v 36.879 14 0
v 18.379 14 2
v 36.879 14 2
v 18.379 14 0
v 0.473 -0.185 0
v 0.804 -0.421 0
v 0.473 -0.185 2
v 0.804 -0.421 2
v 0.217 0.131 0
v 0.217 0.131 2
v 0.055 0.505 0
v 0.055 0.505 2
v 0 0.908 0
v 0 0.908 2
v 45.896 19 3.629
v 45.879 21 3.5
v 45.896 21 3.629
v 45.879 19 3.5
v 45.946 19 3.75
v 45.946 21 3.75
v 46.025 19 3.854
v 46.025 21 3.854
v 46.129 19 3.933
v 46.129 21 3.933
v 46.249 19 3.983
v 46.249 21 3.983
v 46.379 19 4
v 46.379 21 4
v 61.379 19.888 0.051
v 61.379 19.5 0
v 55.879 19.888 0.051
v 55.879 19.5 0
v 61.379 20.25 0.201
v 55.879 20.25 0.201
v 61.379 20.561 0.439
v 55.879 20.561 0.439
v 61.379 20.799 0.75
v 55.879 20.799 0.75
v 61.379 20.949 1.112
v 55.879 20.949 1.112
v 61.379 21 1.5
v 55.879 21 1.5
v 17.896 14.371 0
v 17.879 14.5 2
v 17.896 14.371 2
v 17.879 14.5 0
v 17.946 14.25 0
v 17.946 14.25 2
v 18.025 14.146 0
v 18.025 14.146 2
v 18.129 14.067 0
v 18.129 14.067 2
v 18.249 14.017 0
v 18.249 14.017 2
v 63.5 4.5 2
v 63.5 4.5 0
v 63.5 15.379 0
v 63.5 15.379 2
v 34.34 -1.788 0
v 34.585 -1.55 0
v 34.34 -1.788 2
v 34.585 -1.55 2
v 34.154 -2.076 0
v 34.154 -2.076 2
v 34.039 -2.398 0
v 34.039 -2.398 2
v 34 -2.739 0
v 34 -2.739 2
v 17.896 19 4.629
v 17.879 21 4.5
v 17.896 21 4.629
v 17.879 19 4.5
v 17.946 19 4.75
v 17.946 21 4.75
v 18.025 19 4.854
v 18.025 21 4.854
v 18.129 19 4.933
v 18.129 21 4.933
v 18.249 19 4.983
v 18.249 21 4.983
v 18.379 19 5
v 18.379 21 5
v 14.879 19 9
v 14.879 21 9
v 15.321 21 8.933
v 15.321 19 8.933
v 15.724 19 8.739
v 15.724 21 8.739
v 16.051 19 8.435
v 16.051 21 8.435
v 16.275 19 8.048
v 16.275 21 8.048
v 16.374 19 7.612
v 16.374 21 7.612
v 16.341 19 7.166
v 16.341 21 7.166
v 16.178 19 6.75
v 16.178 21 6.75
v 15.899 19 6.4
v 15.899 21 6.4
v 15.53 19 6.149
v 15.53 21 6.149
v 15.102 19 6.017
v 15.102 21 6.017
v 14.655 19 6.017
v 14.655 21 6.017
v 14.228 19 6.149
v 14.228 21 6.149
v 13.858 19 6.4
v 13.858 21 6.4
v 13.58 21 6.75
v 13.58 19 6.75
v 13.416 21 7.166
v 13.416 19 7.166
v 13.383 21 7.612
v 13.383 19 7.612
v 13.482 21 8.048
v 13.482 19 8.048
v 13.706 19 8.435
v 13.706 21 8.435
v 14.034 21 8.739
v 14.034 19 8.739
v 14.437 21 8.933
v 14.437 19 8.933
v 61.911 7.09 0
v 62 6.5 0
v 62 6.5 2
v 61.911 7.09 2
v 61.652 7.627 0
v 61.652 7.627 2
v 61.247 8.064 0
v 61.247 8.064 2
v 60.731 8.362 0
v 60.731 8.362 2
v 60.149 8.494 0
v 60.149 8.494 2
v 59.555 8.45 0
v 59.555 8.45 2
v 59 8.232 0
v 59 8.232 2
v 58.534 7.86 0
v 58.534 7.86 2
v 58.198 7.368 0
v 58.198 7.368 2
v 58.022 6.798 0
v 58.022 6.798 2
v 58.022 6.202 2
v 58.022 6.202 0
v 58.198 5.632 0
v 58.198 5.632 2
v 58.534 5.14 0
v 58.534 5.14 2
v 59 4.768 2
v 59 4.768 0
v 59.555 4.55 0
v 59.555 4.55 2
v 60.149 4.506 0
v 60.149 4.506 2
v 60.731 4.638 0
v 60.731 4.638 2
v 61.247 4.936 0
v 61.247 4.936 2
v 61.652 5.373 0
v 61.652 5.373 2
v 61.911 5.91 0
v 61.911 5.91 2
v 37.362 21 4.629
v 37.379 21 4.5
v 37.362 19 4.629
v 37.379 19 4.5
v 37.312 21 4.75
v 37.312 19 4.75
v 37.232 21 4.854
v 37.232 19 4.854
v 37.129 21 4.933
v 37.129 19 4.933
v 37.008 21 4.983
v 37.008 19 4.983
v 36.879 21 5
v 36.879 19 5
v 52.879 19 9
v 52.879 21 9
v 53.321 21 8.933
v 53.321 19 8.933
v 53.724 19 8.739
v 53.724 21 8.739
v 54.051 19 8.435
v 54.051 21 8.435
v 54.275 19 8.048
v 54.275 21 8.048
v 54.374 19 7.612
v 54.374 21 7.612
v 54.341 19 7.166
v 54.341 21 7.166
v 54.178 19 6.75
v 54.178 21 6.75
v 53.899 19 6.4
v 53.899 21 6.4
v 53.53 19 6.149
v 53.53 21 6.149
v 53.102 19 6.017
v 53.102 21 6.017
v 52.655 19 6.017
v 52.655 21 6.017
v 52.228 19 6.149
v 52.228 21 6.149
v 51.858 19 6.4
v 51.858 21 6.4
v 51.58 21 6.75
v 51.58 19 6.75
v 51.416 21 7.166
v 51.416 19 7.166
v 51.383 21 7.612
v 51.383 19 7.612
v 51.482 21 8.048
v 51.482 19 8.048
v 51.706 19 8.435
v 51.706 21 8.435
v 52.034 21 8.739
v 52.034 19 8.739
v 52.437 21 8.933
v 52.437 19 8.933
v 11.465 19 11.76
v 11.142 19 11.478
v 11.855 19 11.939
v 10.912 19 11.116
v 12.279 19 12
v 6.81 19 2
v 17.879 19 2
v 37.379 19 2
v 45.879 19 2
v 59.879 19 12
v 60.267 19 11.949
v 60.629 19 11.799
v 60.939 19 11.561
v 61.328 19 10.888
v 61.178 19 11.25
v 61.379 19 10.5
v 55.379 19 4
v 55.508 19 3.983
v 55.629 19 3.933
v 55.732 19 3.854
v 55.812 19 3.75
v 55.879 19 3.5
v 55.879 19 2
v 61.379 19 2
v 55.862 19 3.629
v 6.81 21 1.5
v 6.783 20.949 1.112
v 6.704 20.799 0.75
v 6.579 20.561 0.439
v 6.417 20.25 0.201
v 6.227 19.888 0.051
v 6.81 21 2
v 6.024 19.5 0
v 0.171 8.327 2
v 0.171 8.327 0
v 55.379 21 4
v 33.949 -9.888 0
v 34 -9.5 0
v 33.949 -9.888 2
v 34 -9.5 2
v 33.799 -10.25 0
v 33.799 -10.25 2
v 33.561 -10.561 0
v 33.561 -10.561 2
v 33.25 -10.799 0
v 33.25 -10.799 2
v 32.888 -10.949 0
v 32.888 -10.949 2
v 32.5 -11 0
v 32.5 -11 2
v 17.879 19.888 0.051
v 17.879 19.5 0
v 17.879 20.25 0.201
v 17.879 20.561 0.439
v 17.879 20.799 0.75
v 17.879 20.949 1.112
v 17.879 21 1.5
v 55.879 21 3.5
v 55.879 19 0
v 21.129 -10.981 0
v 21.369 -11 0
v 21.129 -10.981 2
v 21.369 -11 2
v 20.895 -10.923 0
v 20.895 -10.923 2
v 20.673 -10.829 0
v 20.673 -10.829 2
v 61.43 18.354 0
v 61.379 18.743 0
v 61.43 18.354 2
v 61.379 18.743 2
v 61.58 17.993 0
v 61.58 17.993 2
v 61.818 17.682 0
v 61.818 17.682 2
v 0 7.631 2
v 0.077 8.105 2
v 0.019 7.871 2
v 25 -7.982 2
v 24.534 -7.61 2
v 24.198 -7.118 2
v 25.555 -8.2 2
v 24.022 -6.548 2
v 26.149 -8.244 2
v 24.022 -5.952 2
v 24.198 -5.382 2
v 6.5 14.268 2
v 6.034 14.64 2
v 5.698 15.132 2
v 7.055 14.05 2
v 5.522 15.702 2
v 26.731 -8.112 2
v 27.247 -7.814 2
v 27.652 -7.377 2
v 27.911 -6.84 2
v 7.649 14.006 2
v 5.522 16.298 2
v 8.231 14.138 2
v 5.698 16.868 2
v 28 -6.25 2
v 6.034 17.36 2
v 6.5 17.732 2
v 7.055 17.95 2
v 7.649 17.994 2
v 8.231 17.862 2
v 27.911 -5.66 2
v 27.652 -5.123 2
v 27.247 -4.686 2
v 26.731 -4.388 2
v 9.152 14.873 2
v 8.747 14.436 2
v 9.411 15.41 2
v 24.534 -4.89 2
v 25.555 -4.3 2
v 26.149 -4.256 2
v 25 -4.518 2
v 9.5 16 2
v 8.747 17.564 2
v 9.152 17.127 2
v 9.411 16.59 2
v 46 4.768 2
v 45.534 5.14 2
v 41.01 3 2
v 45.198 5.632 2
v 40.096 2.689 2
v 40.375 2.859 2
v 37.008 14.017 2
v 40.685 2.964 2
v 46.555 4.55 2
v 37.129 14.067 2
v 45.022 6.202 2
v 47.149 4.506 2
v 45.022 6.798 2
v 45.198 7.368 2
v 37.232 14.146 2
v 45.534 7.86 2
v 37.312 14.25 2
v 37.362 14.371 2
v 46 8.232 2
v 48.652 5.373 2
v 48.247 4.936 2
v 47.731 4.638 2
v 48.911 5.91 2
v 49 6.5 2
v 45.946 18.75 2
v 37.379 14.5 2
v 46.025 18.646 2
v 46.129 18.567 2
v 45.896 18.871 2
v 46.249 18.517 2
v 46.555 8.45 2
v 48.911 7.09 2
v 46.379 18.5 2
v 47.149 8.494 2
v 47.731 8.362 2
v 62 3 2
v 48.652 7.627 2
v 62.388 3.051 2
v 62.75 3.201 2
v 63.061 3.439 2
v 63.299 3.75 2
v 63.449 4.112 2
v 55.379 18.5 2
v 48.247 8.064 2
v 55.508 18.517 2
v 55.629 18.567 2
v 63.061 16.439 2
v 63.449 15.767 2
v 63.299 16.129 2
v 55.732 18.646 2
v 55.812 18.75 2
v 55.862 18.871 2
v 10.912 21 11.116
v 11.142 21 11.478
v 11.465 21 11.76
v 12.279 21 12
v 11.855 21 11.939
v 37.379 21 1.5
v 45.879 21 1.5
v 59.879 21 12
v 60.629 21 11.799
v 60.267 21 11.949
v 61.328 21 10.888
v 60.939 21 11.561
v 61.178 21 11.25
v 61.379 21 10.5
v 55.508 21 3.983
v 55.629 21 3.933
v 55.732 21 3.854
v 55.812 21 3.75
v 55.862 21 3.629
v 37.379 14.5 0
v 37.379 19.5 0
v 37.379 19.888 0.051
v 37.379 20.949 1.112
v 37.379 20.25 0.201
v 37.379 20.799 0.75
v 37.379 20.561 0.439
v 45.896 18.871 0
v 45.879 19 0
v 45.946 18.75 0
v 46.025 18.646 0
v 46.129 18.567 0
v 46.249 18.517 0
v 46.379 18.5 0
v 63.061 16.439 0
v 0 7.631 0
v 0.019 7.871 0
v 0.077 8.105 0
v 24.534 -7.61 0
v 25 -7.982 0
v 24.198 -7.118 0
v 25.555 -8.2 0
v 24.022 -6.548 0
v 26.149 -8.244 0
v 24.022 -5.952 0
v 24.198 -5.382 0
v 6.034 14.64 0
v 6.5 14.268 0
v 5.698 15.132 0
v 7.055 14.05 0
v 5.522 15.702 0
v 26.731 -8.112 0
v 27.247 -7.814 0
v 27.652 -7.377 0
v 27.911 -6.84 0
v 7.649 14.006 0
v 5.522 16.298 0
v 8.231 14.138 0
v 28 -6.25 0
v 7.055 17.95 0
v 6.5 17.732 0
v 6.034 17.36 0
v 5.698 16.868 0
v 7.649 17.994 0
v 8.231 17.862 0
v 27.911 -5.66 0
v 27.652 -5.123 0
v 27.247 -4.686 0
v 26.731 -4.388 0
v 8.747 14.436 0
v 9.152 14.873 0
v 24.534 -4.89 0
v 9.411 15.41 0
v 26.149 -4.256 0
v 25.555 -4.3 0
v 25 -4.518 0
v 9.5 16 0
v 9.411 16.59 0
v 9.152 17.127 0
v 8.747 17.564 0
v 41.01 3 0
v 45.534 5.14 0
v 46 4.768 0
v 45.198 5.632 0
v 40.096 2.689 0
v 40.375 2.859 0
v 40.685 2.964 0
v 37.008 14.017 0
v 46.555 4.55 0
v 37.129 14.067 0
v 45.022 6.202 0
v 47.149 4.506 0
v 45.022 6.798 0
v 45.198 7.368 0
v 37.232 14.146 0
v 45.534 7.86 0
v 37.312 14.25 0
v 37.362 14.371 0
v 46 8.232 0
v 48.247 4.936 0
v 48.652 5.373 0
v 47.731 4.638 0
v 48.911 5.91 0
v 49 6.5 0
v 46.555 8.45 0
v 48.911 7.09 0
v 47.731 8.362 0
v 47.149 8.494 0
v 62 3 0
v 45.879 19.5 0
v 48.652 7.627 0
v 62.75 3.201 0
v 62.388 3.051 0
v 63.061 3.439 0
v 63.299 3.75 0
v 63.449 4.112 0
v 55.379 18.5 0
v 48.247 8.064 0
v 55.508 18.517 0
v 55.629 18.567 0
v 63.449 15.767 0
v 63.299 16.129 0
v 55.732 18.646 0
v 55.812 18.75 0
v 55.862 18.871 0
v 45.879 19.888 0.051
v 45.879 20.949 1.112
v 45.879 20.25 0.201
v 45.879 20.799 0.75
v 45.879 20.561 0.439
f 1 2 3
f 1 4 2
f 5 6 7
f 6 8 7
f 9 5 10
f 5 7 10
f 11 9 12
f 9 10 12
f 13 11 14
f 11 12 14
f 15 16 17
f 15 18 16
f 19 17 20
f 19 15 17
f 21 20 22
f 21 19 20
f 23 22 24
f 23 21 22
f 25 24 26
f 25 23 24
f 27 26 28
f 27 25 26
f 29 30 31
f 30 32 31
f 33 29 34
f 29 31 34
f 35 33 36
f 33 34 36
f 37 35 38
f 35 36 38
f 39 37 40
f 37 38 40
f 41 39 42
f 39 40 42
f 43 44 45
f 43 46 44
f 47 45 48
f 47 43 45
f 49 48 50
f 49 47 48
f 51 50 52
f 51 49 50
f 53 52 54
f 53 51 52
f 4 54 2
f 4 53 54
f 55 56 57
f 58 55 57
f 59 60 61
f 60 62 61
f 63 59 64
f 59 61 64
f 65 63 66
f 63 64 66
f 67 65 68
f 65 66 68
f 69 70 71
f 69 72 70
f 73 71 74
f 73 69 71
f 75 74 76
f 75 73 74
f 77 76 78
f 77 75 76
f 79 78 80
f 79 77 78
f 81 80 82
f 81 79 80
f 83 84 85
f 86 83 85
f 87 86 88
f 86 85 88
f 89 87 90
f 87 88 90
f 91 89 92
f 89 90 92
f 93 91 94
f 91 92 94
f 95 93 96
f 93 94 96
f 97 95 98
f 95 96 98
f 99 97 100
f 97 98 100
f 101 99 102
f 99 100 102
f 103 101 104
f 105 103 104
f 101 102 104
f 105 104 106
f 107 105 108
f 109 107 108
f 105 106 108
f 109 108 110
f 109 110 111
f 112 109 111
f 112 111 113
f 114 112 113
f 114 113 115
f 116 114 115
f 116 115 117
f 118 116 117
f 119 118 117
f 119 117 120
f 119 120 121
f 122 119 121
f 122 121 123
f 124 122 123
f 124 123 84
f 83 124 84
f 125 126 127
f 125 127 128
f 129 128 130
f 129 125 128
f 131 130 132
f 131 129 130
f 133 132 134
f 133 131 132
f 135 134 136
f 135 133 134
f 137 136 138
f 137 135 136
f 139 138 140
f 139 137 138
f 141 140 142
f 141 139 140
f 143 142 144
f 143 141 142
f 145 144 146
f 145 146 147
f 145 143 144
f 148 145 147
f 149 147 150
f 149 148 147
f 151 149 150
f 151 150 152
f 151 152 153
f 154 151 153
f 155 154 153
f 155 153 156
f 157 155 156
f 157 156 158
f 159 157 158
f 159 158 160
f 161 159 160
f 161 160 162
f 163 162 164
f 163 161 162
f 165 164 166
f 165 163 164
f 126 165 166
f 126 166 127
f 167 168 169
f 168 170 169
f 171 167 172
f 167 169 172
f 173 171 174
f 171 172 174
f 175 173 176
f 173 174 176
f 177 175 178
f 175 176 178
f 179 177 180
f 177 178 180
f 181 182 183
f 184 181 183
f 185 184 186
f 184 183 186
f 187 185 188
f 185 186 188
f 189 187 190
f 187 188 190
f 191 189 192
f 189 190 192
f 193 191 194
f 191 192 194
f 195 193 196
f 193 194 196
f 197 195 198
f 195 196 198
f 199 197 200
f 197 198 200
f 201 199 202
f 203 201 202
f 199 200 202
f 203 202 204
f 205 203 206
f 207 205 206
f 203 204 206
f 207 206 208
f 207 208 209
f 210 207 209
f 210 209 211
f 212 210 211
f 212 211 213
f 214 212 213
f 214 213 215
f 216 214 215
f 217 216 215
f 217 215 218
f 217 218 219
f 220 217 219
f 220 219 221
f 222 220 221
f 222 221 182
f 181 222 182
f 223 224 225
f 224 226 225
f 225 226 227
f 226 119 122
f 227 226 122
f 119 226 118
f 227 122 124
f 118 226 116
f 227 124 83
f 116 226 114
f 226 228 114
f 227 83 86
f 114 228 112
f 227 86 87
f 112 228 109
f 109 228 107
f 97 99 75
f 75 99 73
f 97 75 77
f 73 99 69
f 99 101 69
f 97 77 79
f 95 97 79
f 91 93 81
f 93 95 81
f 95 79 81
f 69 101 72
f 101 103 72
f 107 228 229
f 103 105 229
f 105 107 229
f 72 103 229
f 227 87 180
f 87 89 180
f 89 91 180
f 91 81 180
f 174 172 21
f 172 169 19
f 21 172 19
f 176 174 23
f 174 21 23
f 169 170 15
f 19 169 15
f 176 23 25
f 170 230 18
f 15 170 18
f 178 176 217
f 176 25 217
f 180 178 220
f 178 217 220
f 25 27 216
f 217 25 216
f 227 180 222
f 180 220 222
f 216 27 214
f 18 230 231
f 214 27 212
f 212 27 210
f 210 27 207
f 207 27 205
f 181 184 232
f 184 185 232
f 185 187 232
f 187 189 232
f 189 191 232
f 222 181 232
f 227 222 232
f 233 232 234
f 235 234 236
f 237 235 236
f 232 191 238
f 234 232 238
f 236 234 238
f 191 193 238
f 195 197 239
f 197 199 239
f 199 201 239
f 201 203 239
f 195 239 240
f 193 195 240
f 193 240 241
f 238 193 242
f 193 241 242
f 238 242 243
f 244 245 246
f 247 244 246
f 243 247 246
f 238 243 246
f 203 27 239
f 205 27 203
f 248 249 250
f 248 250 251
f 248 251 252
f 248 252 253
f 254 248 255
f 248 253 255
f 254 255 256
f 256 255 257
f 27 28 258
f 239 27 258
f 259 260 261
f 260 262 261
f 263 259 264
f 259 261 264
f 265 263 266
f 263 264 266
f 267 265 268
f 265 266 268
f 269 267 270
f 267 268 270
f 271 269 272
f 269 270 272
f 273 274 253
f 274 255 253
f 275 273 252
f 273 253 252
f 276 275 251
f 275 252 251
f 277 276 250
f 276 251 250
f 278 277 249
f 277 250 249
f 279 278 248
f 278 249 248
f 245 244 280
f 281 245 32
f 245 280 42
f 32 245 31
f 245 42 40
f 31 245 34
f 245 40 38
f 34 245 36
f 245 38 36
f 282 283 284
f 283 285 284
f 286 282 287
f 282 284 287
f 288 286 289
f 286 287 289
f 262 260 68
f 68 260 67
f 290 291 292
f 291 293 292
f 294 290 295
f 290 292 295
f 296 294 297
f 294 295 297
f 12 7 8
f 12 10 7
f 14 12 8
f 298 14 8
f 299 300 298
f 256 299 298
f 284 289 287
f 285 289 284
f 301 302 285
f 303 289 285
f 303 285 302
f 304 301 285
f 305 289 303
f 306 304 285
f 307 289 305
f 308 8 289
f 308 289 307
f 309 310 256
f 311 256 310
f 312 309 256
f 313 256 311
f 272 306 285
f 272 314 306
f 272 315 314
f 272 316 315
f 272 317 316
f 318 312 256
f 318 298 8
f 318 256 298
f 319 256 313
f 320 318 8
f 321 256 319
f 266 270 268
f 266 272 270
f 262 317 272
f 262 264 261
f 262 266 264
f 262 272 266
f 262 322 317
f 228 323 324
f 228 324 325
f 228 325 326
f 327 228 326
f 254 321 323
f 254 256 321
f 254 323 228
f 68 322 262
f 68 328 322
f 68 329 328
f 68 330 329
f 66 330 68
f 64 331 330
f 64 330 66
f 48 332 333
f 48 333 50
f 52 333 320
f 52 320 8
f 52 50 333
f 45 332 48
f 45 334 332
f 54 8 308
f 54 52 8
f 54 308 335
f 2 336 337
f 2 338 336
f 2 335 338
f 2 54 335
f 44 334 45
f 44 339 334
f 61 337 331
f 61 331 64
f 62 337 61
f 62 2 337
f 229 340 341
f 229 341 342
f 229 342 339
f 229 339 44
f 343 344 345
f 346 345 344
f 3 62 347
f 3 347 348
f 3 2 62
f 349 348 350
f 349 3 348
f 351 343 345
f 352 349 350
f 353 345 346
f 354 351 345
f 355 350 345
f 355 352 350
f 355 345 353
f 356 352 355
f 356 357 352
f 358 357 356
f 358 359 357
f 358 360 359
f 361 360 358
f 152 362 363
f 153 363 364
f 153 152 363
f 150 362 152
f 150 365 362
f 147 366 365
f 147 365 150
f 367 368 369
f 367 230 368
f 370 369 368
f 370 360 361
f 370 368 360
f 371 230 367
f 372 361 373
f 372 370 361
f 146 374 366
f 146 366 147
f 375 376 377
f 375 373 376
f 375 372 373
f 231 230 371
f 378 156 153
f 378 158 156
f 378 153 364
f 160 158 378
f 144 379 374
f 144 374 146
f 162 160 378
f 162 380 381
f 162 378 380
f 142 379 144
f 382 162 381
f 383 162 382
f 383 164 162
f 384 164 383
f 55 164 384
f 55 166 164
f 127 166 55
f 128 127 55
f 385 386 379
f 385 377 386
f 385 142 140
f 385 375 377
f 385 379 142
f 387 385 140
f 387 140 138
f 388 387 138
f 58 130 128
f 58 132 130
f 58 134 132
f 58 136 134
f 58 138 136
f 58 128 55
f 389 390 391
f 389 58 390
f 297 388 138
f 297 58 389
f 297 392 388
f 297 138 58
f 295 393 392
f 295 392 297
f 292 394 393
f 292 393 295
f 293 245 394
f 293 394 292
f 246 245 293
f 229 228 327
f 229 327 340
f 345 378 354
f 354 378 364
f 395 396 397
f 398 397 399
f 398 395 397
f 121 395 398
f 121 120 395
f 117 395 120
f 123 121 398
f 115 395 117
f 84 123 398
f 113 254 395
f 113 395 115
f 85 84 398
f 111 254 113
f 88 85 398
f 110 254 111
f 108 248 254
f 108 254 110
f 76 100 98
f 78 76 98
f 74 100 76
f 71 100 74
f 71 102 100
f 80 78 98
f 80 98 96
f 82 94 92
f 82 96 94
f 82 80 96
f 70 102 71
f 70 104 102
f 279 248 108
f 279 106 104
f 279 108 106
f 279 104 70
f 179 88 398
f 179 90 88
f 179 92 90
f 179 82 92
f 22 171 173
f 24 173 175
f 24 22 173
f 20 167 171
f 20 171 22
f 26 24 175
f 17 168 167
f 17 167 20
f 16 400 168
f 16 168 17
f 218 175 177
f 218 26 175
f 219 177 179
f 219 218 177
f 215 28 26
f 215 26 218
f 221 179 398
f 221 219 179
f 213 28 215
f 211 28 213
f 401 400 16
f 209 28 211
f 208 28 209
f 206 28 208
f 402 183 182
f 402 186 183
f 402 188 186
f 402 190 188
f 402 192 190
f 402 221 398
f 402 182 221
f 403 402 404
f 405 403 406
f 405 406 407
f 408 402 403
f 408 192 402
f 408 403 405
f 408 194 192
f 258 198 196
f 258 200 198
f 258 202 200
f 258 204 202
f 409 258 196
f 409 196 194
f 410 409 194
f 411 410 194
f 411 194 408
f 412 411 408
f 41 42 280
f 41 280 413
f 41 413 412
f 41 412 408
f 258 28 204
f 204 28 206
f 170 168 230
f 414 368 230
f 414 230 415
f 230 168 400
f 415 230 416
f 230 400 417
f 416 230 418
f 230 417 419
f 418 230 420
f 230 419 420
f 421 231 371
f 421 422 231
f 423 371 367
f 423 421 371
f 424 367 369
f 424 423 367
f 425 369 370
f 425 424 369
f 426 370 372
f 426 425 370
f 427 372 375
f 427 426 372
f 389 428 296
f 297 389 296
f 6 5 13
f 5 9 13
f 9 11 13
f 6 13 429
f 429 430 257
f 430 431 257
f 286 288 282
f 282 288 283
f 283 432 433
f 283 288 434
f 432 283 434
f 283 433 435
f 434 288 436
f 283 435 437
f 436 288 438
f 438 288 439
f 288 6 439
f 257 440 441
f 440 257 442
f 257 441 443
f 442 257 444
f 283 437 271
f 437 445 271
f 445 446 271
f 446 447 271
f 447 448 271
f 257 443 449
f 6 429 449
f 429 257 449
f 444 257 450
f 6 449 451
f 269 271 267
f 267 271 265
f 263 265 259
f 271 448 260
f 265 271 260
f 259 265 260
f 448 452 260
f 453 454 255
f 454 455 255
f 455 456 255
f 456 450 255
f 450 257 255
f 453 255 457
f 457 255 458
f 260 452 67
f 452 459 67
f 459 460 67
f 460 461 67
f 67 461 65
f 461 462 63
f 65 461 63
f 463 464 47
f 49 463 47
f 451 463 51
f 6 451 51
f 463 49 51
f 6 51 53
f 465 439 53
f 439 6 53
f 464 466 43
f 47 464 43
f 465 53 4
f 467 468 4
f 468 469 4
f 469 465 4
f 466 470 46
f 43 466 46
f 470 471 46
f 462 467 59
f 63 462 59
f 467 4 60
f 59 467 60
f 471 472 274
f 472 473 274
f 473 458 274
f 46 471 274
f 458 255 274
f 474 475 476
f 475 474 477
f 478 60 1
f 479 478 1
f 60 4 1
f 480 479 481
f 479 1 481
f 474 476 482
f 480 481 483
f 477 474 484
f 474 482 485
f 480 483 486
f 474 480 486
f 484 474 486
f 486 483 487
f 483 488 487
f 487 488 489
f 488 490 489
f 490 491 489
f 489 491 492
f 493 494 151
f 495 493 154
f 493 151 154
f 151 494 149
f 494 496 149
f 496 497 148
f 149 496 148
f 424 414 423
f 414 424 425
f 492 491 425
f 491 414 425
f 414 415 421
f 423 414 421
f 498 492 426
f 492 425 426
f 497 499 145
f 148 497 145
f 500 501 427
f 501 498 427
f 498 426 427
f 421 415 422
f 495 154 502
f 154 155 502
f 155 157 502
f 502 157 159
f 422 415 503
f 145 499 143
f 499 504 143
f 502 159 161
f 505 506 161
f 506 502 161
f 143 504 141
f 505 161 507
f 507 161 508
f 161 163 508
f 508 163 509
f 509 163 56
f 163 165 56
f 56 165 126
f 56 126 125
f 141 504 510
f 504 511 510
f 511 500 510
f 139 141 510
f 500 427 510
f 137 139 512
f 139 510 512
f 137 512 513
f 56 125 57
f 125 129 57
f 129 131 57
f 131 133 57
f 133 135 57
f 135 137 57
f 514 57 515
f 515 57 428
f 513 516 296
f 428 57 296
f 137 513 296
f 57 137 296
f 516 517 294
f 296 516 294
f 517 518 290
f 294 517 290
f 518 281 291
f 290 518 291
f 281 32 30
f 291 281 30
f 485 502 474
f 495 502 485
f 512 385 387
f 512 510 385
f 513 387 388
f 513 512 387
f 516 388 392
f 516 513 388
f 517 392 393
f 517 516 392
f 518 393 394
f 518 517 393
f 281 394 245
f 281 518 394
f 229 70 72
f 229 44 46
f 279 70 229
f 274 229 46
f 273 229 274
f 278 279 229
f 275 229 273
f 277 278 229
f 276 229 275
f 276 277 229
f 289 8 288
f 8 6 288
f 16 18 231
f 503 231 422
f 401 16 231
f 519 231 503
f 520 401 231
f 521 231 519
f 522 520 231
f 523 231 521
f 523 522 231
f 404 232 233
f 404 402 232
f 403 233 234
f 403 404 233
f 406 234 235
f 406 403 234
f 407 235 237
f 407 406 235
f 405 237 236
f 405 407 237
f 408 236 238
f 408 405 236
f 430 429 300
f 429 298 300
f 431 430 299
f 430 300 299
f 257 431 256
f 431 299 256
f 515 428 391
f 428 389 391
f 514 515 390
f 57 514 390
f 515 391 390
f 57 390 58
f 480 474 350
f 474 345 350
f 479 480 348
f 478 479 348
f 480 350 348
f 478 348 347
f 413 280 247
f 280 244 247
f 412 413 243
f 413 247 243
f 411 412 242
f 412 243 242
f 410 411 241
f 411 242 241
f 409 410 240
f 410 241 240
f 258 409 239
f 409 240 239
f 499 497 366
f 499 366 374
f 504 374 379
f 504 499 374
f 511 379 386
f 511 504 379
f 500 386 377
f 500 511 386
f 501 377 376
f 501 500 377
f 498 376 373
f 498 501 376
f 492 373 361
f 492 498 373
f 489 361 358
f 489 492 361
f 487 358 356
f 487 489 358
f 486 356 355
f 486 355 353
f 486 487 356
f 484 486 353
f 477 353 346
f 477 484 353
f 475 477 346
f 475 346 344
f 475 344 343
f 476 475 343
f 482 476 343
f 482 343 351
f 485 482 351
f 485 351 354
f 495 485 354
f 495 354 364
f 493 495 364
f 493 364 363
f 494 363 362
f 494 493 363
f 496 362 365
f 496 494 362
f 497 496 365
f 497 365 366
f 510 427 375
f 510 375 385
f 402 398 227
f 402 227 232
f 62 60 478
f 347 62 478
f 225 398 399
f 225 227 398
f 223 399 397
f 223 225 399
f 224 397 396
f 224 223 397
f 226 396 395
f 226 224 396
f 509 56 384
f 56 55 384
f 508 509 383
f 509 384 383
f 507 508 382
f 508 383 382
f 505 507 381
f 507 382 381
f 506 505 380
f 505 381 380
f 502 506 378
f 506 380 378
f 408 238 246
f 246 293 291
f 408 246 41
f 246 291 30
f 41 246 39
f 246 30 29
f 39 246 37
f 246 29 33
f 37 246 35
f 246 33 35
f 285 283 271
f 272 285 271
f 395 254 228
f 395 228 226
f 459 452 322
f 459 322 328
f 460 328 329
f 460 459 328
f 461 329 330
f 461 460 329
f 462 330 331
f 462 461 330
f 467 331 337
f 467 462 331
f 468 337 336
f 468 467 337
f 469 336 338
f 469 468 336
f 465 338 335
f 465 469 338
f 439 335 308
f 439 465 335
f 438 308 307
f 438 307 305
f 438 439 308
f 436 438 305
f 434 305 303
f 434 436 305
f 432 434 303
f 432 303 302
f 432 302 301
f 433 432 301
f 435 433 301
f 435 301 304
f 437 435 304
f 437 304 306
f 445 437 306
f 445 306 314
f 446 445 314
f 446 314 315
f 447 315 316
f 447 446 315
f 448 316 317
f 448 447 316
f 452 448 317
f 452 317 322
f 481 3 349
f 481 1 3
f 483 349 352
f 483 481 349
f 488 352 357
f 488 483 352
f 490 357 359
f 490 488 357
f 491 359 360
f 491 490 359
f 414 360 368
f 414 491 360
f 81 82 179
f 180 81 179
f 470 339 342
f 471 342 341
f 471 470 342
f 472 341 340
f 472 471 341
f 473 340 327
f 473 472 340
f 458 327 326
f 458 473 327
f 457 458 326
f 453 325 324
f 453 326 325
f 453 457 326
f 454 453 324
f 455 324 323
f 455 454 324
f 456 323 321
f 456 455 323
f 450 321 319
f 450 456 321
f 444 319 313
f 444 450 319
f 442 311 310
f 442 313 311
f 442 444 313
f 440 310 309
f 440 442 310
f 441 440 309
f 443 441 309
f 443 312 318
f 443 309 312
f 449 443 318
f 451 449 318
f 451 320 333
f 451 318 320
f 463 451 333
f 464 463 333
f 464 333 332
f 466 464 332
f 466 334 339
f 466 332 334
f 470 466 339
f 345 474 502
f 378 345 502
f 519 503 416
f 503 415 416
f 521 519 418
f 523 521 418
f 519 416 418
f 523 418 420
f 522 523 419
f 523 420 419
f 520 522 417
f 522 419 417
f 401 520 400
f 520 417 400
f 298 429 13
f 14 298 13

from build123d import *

# Parameters (mm, degrees)
SKETCH1_R           = 2
BOSS_EXTRUDE1_DEPTH = 2
SKETCH2_W           = 54.569155846
SKETCH2_H           = 2
BOSS_EXTRUDE2_DEPTH = 10
SKETCH3_R           = 1.5
CUT_EXTRUDE1_DEPTH  = 73.112758927
SKETCH4_W           = 19.5
SKETCH4_H           = 5
SKETCH4_W_2         = 10
SKETCH4_H_2         = 4
CUT_EXTRUDE2_DEPTH  = 2.5
SKETCH5_W           = 19.5
SKETCH5_H           = 2
CUT_EXTRUDE3_DEPTH  = 4.5
FILLET1_R           = 1.5
FILLET2_R           = 0.5


with BuildPart() as part:
    # Sketch1 → Boss-Extrude1 (new body)
    with BuildSketch(Plane.XY):
        Polygon((0, 0), (21, -11), (27.728873239, -11), (34, -11), (34, -2), (40.5, 3), (63.5, 3), (63.5, 16), (61.378679656, 18.121320344), (61.378679656, 21), (6.80952381, 21), (0, 8), align=None)
        with Locations((26, -6.25)):
            Circle(SKETCH1_R, mode=Mode.SUBTRACT)
        with Locations((47, 6.5)):
            Circle(SKETCH1_R, mode=Mode.SUBTRACT)
        with Locations((60, 6.5)):
            Circle(SKETCH1_R, mode=Mode.SUBTRACT)
        with Locations((7.5, 16)):
            Circle(SKETCH1_R, mode=Mode.SUBTRACT)
    extrude(amount=BOSS_EXTRUDE1_DEPTH)

    # Sketch2 → Boss-Extrude2 (add)
    with BuildSketch(Plane.XY.offset(2)):
        with Locations((34.094101733, 20)):
            Rectangle(SKETCH2_W, SKETCH2_H)
    extrude(amount=BOSS_EXTRUDE2_DEPTH)

    # Sketch3 → Cut-Extrude1 (cut, through all)
    with BuildSketch(Plane(origin=(0, 21, 0), x_dir=(1, 0, 0), z_dir=(0, 1, 0))):
        with Locations(Location((52.878679656, -7.5, 0), (0, 0, 270))):
            Circle(SKETCH3_R)
        with Locations(Location((14.878679656, -7.5, 0), (0, 0, 270))):
            Circle(SKETCH3_R)
        Polygon((6.80952381, -2), (11.30952381, -12), (6.80952381, -12), align=None)
    extrude(amount=-CUT_EXTRUDE1_DEPTH, mode=Mode.SUBTRACT)

    # Sketch4 → Cut-Extrude2 (cut)
    with BuildSketch(Plane(origin=(0, 21, 0), x_dir=(1, 0, 0), z_dir=(0, 1, 0))):
        with Locations((27.628679656, -2.5)):
            Rectangle(SKETCH4_W, SKETCH4_H)
        with Locations((50.878679656, -2)):
            Rectangle(SKETCH4_W_2, SKETCH4_H_2)
    extrude(amount=-CUT_EXTRUDE2_DEPTH, mode=Mode.SUBTRACT)

    # Sketch5 → Cut-Extrude3 (cut)
    with BuildSketch(Plane(origin=(0, 18.5, 0), x_dir=(1, 0, 0), z_dir=(0, 1, 0))):
        with Locations((27.628679656, -1)):
            Rectangle(SKETCH5_W, SKETCH5_H)
    extrude(amount=-CUT_EXTRUDE3_DEPTH, mode=Mode.SUBTRACT)

    # Fillet1
    fillet1_edges = [part.edges().sort_by_distance(p)[0] for p in [
        (58.628679656, 21, 0),
        (0, 8, 1),
        (61.378679656, 18.121320344, 1),
        (63.5, 16, 1),
        (63.5, 3, 1),
        (40.5, 3, 1),
        (34, -2, 1),
        (34, -11, 1),
        (21, -11, 1),
        (0, 0, 1),
        (61.378679656, 20, 12),
        (11.30952381, 20, 12),
        (41.628679656, 21, 0),
        (12.344101733, 21, 0),
    ]]
    fillet(fillet1_edges, radius=FILLET1_R)

    # Fillet2
    fillet2_edges = [part.edges().sort_by_distance(p)[0] for p in [
        (37.378679656, 20, 5),
        (37.378679656, 14, 1),
        (55.878679656, 20, 4),
        (45.878679656, 20, 4),
        (45.878679656, 18.5, 1),
        (55.878679656, 18.5, 1),
        (17.878679656, 14, 1),
        (17.878679656, 20, 5),
    ]]
    fillet(fillet2_edges, radius=FILLET2_R)


solid = part.part
